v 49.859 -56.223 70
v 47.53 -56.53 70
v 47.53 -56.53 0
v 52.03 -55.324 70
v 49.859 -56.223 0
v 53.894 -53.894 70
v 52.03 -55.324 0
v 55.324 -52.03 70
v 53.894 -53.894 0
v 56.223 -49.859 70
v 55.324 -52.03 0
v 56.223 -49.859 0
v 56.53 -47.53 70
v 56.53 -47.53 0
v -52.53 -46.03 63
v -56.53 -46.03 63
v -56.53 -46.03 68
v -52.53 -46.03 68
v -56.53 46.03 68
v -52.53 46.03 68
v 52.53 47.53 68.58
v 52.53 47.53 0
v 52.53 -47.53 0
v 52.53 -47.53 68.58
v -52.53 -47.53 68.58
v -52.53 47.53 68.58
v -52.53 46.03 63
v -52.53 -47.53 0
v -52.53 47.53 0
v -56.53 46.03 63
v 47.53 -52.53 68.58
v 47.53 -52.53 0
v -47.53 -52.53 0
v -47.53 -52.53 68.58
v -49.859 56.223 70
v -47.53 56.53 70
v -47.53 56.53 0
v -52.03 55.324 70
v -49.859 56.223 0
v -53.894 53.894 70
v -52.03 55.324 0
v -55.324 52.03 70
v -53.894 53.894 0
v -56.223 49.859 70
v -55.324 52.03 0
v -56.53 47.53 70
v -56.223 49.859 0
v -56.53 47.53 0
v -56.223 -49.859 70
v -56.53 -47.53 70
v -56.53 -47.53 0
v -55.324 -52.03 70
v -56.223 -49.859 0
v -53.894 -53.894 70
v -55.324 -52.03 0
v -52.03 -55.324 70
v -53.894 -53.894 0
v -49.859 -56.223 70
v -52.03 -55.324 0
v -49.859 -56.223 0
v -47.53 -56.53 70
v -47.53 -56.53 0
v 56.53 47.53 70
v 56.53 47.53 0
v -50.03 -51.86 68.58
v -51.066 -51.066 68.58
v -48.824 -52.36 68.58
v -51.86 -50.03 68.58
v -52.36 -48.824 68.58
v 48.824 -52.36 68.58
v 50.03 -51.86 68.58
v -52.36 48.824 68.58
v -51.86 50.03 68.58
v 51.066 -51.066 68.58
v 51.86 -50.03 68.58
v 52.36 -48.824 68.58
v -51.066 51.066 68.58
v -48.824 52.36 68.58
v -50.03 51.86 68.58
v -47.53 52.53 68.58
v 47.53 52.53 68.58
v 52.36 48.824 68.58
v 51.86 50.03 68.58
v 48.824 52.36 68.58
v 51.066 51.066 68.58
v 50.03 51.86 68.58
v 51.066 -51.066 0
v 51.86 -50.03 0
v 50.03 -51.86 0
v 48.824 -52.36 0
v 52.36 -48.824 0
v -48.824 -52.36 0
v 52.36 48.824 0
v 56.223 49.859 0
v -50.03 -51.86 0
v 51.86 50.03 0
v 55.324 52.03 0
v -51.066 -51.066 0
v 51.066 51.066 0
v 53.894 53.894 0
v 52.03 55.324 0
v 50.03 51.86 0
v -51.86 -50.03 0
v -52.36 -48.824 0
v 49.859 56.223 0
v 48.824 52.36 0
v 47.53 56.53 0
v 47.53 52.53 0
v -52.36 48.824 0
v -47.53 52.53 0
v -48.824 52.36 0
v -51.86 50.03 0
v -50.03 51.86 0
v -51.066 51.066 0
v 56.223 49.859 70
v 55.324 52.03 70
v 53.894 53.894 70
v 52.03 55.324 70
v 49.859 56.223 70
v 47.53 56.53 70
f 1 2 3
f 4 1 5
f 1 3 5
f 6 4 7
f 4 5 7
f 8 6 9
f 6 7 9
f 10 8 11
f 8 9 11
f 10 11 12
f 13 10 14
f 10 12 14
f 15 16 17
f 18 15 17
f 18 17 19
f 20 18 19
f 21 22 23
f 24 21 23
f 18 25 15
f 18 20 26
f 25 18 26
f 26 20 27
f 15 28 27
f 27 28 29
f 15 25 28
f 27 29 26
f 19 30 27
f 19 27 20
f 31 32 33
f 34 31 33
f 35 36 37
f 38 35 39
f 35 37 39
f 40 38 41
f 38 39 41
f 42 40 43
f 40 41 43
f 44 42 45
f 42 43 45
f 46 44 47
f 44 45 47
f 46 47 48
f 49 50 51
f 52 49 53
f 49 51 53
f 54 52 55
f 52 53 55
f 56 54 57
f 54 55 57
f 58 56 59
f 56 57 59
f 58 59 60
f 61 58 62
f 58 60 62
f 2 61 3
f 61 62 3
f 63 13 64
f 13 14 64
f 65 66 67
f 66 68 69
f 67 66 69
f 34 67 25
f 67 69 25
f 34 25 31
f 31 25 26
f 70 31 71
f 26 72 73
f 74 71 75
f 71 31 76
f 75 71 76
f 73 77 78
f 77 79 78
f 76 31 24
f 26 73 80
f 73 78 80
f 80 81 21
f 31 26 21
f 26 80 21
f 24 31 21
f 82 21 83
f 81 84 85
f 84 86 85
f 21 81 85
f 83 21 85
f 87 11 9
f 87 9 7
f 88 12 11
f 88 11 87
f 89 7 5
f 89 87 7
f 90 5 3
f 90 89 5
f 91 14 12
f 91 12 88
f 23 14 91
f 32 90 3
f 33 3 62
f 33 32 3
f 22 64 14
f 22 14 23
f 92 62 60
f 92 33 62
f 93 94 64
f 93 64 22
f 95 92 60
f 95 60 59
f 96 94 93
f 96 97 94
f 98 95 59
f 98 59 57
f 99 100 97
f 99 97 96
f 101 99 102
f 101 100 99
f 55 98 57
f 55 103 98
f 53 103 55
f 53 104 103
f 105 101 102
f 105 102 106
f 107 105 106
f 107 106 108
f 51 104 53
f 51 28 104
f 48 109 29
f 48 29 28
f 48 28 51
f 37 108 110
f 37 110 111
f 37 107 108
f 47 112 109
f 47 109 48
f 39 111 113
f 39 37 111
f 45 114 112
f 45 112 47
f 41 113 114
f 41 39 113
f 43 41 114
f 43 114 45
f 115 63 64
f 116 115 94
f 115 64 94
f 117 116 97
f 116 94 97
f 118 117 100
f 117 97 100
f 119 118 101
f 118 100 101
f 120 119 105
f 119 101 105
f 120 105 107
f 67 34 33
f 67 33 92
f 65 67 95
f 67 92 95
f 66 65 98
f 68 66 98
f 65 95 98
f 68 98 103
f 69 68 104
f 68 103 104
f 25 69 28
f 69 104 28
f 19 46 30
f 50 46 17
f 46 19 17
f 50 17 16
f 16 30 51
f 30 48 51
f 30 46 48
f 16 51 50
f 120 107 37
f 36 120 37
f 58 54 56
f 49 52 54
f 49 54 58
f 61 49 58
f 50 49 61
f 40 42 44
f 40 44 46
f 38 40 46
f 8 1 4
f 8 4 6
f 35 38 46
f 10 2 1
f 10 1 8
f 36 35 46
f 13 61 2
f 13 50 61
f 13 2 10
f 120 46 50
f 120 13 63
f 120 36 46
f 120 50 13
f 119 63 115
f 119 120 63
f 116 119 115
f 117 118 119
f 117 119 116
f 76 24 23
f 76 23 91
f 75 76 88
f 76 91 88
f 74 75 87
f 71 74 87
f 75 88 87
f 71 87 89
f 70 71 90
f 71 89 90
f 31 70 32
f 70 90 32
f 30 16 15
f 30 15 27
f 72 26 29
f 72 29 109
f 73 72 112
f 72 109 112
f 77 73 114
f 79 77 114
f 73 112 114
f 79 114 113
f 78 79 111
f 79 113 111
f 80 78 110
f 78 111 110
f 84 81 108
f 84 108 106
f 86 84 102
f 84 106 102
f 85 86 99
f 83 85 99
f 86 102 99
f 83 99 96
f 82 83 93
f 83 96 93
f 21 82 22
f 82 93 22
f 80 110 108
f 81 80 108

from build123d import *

# Parameters (mm, degrees)
SHELL_WALLS_DEPTH             = 68.58
SHELL_TOP_DEPTH               = 1.42
REAR_COOLING_FAN_CUTOUT_REACH = 146.493
REAR_COOLING_FAN_SKETCH_W     = 5
REAR_COOLING_FAN_SKETCH_H     = 92.06


with BuildPart() as part:
    # Shell → Shell Walls (new body)
    with BuildSketch(Plane.XY):
        with BuildLine():
            Line((-47.53, 56.53), (47.53, 56.53))
            ThreePointArc((47.53, 56.53), (53.893961031, 53.893961031), (56.53, 47.53))
            Line((56.53, 47.53), (56.53, -47.53))
            ThreePointArc((56.53, -47.53), (53.893961031, -53.893961031), (47.53, -56.53))
            Line((47.53, -56.53), (-47.53, -56.53))
            ThreePointArc((-47.53, -56.53), (-53.893961031, -53.893961031), (-56.53, -47.53))
            Line((-56.53, -47.53), (-56.53, 47.53))
            ThreePointArc((-56.53, 47.53), (-53.893961031, 53.893961031), (-47.53, 56.53))
        make_face()
        with BuildLine():
            Line((-47.53, 52.53), (47.53, 52.53))
            ThreePointArc((47.53, 52.53), (51.065533906, 51.065533906), (52.53, 47.53))
            Line((52.53, 47.53), (52.53, -47.53))
            ThreePointArc((52.53, -47.53), (51.065533906, -51.065533906), (47.53, -52.53))
            Line((47.53, -52.53), (-47.53, -52.53))
            ThreePointArc((-47.53, -52.53), (-51.065533906, -51.065533906), (-52.53, -47.53))
            Line((-52.53, -47.53), (-52.53, 47.53))
            ThreePointArc((-52.53, 47.53), (-51.065533906, 51.065533906), (-47.53, 52.53))
        make_face(mode=Mode.SUBTRACT)
    extrude(amount=SHELL_WALLS_DEPTH)

    # Sketch3 → Shell Top (add)
    with BuildSketch(Plane.XY.offset(68.58)):
        with BuildLine():
            Line((-56.53, 47.53), (-56.53, -47.53))
            ThreePointArc((-56.53, -47.53), (-53.893961031, -53.893961031), (-47.53, -56.53))
            Line((-47.53, -56.53), (47.53, -56.53))
            ThreePointArc((47.53, -56.53), (53.893961031, -53.893961031), (56.53, -47.53))
            Line((56.53, -47.53), (56.53, 47.53))
            ThreePointArc((56.53, 47.53), (53.893961031, 53.893961031), (47.53, 56.53))
            Line((47.53, 56.53), (-47.53, 56.53))
            ThreePointArc((-47.53, 56.53), (-53.893961031, 53.893961031), (-56.53, 47.53))
        make_face()
    extrude(amount=SHELL_TOP_DEPTH)

    # Rear-Cooling Fan Sketch → Rear-Cooling Fan Cutout (cut, up to next)
    with BuildSketch(Plane.ZY.offset(56.53), mode=Mode.PRIVATE) as rear_cooling_fan_cutout_sk1:
        with Locations((65.5, 0)):
            Rectangle(REAR_COOLING_FAN_SKETCH_W, REAR_COOLING_FAN_SKETCH_H)
    rear_cooling_fan_cutout_tool1 = extrude(rear_cooling_fan_cutout_sk1.sketch, amount=-REAR_COOLING_FAN_CUTOUT_REACH, mode=Mode.PRIVATE) & part.part
    add(rear_cooling_fan_cutout_tool1.solids().sort_by_distance((-56.53, 0, 65.5))[0], mode=Mode.SUBTRACT)


solid = part.part
